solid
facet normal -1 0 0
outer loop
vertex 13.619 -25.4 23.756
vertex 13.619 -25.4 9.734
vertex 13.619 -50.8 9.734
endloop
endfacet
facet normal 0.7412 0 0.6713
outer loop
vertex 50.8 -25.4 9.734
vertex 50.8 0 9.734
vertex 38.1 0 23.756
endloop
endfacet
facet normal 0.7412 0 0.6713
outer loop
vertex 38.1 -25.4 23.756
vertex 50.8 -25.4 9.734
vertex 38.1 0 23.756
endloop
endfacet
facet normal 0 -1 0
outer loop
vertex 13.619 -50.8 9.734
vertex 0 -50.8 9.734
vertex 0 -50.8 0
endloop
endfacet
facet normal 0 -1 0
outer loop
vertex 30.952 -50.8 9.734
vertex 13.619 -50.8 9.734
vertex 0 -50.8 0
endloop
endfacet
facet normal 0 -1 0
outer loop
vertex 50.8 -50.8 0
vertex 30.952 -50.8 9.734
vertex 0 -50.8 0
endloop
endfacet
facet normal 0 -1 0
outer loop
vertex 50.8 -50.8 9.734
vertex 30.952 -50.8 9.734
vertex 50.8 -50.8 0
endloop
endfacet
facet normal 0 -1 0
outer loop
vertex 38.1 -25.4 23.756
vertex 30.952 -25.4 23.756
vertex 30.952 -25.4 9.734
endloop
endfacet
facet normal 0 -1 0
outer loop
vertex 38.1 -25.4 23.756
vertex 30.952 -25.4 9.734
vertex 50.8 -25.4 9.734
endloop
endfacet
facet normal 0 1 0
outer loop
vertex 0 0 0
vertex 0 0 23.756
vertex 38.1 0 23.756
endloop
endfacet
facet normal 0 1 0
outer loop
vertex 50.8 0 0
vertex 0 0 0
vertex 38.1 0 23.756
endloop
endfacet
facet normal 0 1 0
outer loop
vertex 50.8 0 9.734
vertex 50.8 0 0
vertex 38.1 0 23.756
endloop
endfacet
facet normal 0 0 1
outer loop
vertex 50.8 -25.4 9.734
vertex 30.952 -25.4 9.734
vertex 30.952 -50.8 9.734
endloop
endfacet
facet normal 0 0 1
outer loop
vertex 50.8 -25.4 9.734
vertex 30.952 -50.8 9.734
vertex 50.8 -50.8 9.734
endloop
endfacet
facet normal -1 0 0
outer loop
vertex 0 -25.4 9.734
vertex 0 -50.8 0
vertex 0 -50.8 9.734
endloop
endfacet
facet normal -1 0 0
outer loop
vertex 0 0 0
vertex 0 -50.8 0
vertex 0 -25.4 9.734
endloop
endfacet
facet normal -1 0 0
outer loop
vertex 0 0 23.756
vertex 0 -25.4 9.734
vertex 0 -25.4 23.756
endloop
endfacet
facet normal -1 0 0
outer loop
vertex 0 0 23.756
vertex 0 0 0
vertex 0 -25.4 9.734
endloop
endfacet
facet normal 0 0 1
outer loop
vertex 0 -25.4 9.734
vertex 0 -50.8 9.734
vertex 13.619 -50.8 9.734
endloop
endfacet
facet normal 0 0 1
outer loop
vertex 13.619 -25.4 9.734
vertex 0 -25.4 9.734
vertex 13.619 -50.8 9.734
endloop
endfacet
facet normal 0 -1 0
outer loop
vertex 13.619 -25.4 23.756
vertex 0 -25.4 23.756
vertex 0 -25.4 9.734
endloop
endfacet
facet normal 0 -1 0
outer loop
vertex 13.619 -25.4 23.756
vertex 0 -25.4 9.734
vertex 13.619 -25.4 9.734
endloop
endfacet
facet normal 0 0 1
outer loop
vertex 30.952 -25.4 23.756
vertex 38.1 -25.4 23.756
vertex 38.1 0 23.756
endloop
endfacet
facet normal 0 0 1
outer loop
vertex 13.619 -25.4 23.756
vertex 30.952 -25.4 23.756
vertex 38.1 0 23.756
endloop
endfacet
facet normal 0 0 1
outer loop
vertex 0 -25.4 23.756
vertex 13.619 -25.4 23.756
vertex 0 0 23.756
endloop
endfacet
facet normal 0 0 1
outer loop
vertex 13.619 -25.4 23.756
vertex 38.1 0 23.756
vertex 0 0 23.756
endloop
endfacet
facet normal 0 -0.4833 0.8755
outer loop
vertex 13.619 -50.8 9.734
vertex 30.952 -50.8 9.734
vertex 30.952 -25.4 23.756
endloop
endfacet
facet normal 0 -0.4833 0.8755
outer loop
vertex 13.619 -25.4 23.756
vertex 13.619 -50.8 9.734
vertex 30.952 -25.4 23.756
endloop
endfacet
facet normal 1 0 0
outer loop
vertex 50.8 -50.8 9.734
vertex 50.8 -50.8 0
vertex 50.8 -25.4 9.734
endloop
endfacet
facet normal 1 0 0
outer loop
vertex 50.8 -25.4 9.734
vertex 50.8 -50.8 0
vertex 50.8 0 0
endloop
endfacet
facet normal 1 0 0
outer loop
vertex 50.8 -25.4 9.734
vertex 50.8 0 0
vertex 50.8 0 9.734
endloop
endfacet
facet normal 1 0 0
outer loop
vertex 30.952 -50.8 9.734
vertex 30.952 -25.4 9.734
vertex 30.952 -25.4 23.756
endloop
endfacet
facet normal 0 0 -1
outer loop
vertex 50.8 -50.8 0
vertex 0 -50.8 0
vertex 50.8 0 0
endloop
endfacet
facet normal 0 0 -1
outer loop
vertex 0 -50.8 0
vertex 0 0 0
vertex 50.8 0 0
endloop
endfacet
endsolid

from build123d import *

# Parameters (mm, degrees)
F1_DEPTH = 25.4
F2_W     = 50.8
F2_H     = 9.7338882406
F3_DEPTH = 25.4
F4_W     = 17.3329235986
F4_H     = 14.0222670068
F5_DEPTH = 25.4
F7_DEPTH = 25.4


with BuildPart() as f1:
    # F0 (on Front) → F1 (new body)
    with BuildSketch(Plane.XZ):
        Polygon((0, 23.7561552475), (0, 0), (50.8, 0), (50.8, 9.7338882406), (38.1, 23.7561552475), align=None)
    extrude(amount=F1_DEPTH)

    # F2 (on face) → F3 (join)
    with BuildSketch(Plane.XZ.offset(25.4)):
        with Locations((25.4, 4.8669441203)):
            Rectangle(F2_W, F2_H)
    extrude(amount=F3_DEPTH)

    # F4 (on face) → F5 (join)
    with BuildSketch(Plane.XZ.offset(25.4)):
        with Locations((22.2851852886, 16.7450217441)):
            Rectangle(F4_W, F4_H)
    extrude(amount=F5_DEPTH)

    # F6 (on face) → F7 (cut)
    with BuildSketch(Plane.YZ.offset(30.9516470879)):
        Polygon((-50.8, 23.7561552475), (-50.8, 9.7338882406), (-25.4, 23.7561552475), align=None)
    extrude(amount=-F7_DEPTH, mode=Mode.SUBTRACT)


solid = f1.part
